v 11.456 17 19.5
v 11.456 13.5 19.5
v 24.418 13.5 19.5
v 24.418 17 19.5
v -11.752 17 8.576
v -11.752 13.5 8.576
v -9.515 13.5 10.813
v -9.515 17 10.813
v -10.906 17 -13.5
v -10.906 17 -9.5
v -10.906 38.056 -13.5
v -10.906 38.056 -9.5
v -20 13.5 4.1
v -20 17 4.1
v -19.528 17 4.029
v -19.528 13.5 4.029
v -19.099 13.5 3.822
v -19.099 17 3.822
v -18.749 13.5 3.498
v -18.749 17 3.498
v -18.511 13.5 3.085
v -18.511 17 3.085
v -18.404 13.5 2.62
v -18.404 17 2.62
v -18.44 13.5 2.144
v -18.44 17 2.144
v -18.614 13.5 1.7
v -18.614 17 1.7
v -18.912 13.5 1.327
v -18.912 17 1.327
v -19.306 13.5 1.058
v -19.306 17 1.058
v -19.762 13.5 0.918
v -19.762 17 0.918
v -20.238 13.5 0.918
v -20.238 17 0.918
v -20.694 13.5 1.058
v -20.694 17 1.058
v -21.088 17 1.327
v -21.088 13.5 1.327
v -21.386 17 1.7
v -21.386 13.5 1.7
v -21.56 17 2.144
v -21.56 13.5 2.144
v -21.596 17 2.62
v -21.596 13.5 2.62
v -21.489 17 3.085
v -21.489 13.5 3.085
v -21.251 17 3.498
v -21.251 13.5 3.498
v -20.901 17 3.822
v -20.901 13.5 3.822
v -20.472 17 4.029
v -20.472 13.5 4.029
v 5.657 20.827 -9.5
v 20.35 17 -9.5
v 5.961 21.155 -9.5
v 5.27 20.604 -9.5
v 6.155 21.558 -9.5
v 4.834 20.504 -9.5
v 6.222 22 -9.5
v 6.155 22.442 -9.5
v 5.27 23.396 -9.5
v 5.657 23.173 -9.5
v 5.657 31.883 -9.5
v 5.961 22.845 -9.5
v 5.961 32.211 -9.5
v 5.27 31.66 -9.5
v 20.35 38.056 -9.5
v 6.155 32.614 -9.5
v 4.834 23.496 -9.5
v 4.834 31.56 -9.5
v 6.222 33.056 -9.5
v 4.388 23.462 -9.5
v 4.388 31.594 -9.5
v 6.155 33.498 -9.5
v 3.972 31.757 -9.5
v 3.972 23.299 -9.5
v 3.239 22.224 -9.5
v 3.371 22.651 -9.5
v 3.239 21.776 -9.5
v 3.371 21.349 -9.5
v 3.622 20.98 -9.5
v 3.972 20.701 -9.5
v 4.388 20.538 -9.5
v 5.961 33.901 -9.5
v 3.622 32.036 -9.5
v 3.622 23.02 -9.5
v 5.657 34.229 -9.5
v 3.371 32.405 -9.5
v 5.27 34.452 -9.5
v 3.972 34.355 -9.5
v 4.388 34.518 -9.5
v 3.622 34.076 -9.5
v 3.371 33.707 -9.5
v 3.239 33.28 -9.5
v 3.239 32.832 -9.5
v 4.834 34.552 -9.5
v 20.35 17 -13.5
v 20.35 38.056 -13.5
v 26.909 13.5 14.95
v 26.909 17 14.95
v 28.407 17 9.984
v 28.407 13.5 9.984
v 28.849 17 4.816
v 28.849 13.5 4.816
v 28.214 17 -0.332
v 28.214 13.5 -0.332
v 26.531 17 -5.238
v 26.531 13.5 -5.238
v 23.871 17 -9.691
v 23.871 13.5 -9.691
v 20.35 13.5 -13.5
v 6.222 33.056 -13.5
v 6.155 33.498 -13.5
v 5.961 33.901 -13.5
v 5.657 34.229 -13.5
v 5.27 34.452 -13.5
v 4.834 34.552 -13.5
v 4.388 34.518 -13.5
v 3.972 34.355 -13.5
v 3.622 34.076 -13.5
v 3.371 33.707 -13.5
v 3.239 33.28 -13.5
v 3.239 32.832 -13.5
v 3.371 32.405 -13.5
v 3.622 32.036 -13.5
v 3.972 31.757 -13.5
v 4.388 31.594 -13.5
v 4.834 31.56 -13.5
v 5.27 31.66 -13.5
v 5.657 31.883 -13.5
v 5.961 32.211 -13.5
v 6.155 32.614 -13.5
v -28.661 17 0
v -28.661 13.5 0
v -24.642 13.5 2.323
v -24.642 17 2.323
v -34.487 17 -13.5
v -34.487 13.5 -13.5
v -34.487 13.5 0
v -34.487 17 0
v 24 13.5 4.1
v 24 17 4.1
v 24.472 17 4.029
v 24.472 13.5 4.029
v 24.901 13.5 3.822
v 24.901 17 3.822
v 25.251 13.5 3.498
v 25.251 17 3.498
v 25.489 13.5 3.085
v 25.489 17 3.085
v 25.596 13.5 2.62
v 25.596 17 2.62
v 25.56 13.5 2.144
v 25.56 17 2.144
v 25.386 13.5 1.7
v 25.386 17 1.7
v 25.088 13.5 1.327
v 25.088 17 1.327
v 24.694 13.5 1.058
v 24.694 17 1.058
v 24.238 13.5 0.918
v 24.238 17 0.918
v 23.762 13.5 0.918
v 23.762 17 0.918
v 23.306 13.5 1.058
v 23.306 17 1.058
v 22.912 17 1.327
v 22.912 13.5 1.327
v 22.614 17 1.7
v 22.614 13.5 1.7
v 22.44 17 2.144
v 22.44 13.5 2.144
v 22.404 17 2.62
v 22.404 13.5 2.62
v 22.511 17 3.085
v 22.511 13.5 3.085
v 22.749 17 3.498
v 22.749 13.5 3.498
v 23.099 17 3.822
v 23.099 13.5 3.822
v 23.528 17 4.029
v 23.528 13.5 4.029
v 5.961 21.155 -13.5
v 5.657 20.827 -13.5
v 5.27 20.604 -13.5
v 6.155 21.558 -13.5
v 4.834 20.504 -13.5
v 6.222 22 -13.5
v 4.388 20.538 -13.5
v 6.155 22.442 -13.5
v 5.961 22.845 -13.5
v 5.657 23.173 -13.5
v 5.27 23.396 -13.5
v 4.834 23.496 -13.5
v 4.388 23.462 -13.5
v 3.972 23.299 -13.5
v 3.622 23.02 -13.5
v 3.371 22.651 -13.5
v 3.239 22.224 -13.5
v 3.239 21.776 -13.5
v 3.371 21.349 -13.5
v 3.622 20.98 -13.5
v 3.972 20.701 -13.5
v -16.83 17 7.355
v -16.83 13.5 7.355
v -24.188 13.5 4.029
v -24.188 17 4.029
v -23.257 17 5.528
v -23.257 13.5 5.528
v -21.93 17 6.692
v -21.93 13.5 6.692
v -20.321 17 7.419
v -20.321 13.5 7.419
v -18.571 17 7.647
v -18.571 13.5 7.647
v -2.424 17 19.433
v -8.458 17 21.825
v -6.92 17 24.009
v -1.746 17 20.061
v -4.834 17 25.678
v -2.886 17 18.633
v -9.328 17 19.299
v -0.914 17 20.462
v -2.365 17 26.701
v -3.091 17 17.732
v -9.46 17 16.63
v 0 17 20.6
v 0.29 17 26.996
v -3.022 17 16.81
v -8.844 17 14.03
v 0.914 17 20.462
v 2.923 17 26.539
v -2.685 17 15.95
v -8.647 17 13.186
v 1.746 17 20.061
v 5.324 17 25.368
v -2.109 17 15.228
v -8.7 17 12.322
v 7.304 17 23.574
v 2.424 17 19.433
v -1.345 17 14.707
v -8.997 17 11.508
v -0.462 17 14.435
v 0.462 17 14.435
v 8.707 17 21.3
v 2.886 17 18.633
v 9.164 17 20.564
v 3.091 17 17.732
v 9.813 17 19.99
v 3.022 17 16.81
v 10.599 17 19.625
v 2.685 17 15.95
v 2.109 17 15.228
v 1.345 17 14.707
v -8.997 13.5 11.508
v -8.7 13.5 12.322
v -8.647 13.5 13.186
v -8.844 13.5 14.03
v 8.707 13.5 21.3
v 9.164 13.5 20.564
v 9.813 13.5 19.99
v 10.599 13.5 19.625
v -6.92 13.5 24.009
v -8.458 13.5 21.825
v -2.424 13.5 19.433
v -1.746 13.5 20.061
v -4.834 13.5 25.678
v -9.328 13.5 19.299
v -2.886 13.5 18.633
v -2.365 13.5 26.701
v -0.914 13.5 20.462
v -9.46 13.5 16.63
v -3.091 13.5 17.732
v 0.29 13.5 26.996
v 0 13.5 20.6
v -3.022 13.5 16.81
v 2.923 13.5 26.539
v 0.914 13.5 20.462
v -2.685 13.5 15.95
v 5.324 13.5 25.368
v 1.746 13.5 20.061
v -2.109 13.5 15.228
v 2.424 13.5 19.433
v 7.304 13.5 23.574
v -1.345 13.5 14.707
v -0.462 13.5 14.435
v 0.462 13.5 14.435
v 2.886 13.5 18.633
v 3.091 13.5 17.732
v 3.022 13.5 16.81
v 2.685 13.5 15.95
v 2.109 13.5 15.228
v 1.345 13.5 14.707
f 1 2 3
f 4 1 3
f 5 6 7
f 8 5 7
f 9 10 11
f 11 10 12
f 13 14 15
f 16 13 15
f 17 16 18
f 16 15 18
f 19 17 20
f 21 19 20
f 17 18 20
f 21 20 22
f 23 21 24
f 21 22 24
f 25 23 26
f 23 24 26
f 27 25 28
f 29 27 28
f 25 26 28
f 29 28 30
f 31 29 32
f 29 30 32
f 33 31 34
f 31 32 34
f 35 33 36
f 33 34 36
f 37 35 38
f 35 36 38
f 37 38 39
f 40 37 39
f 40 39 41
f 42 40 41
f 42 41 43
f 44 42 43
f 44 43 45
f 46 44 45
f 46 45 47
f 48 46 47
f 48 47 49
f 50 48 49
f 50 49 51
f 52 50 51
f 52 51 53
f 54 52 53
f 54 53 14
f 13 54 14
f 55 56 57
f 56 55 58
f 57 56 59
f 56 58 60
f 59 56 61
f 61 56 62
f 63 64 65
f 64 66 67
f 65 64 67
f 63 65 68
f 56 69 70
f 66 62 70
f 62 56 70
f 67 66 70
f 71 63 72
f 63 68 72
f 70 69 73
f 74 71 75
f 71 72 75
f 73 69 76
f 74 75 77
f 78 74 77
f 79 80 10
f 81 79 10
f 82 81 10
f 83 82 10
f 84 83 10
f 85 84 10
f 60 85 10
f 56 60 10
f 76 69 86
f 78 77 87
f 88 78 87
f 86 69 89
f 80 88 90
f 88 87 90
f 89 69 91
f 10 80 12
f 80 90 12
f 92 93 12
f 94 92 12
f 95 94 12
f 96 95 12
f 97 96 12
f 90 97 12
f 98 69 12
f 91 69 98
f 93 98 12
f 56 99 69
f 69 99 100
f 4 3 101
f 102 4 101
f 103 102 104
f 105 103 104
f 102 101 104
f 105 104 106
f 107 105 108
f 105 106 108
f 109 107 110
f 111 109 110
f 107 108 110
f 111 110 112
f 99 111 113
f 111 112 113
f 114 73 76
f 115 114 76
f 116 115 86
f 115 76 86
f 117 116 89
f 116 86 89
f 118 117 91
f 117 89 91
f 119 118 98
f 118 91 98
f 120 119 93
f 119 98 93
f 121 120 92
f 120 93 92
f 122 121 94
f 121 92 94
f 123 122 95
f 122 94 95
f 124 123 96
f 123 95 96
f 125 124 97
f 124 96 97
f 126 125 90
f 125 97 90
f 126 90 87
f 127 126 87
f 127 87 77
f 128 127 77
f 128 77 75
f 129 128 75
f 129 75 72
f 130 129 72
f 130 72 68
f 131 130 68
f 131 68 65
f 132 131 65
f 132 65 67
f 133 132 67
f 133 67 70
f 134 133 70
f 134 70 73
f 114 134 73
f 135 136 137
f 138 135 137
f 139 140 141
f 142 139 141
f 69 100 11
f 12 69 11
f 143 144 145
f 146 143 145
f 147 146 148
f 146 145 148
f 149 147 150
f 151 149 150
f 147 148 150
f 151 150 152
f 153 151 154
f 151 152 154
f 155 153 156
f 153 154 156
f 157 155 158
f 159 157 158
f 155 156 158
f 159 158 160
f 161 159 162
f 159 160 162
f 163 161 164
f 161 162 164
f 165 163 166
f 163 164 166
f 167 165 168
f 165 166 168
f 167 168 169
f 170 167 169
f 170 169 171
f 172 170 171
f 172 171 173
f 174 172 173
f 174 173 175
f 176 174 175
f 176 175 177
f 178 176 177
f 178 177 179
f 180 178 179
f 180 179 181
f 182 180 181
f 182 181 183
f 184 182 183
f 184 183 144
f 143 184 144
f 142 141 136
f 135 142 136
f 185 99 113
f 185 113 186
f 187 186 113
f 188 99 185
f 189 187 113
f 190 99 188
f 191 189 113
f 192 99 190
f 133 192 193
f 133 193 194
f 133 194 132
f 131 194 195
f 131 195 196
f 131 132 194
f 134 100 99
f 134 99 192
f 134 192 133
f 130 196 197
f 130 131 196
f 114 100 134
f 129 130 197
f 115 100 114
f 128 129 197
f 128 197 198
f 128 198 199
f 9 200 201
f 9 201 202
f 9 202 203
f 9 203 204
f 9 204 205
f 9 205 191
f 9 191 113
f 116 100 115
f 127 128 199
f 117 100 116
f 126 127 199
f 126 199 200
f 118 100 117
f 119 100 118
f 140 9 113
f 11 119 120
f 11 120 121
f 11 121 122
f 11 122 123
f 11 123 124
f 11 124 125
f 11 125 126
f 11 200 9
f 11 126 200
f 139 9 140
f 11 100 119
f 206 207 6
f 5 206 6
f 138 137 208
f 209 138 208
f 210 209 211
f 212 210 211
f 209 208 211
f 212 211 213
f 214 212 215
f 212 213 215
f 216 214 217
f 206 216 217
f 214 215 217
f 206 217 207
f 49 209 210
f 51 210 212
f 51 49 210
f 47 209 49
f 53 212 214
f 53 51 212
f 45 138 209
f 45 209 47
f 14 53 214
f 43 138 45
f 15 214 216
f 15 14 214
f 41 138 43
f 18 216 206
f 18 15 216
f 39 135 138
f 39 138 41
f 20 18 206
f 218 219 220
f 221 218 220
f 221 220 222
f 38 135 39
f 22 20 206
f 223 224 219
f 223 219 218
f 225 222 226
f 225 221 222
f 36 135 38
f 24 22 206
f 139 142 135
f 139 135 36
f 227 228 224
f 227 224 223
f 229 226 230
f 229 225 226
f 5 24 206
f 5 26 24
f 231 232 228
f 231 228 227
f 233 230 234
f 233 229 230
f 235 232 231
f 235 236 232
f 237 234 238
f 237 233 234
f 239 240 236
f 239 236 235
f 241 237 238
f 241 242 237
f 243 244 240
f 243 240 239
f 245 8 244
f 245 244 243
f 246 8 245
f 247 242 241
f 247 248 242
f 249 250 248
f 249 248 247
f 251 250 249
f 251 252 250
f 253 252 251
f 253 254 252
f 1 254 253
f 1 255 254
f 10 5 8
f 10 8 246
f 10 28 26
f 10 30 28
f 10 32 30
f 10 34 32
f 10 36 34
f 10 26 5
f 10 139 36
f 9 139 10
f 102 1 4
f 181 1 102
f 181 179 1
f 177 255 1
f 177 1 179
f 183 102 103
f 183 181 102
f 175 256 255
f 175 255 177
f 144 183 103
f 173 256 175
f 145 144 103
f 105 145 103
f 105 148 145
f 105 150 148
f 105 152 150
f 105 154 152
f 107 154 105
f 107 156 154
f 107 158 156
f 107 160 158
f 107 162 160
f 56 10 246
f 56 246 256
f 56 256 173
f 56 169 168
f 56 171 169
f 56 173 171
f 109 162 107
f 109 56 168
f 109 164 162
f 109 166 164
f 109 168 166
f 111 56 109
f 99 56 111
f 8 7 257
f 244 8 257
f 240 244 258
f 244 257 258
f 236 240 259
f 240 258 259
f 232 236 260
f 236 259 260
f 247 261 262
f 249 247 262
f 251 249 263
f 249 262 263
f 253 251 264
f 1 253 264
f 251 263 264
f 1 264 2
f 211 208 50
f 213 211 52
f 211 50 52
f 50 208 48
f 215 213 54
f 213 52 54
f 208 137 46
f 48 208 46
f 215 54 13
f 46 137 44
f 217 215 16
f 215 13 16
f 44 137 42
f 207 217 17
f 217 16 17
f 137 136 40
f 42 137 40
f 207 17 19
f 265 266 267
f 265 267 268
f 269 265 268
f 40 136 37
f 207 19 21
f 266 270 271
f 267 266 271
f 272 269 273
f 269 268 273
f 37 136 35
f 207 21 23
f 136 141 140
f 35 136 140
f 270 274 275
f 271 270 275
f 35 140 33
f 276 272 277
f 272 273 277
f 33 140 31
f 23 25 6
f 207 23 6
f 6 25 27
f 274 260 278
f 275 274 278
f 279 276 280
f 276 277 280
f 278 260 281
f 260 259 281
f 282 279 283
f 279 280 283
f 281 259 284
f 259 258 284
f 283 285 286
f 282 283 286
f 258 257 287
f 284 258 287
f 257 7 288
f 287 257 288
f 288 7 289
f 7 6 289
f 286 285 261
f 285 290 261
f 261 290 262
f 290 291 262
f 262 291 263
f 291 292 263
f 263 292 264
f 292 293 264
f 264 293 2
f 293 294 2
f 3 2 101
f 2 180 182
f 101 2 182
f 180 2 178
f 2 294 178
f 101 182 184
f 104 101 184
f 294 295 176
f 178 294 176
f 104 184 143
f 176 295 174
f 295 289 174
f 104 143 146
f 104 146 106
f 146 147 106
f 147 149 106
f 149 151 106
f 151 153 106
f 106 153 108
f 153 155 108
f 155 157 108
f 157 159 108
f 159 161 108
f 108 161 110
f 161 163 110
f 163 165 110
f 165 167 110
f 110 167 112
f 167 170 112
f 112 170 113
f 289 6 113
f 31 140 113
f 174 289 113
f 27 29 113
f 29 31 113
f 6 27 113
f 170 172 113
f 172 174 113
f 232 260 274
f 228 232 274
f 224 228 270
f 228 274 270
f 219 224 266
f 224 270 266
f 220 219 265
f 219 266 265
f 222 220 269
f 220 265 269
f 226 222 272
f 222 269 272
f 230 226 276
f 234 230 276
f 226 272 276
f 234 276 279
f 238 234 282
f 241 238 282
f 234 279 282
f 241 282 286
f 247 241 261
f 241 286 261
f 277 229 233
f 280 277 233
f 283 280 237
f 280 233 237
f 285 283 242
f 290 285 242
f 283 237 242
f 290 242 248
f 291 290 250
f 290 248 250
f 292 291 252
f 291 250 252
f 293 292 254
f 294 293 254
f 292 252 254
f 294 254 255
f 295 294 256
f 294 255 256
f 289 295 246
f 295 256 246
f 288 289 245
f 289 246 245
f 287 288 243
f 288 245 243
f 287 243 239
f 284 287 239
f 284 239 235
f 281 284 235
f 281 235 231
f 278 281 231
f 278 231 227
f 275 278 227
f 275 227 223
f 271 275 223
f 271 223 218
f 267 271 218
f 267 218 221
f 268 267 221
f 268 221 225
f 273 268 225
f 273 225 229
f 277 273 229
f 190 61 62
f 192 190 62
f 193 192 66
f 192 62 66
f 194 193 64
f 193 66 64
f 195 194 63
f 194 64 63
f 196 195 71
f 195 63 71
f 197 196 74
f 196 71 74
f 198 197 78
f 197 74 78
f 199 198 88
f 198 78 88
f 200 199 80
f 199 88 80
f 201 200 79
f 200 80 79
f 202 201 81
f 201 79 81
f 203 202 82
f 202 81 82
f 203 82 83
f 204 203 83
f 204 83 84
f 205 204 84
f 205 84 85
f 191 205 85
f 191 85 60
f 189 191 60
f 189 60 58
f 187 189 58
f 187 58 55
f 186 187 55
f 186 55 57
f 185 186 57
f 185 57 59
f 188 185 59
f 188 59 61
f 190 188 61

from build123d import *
from build123d.topology import SkipClean

# Parameters (mm, degrees)
CROQUIS1_W              = 70
CROQUIS1_H              = 65
EXTRUIR1_DEPTH          = 3.5
CROQUIS2_R              = 3.1
EXTRUIR2_DEPTH          = 5
EXTRUIR3_DEPTH          = 10
CROQUIS4_OUTSIDE_W      = 91.294
CROQUIS4_OUTSIDE_H      = 86.294
EXTRUIR4_DEPTH          = 10
REDONDEO1_R             = 3
EXTRUIR5_DEPTH          = 13.5
EXTRUIR6_DEPTH          = 3.5
CROQUIS7_R              = 1.6
EXTRUIR7_DEPTH          = 47.982330447
CROQUIS8_R              = 3.1
EXTRUIR8_DEPTH          = 5
CROQUIS9_W              = 0.7
CROQUIS9_H              = 10.5
EXTRUIR9_DEPTH          = 10
EXTRUIR10_DEPTH         = 63.752948337
EXTRUIR10_DEPTH_BACK    = 10
CROQUIS10_W             = 3.0625
CROQUIS10_H             = 5
CROQUIS11_W             = 54.8364
CROQUIS11_H             = 21.05596306
SALIENTE_EXTRUIR1_DEPTH = 4
CROQUIS15_W             = 23.581168674
CROQUIS15_H             = 21.05596306
CORTAR_EXTRUIR3_DEPTH   = 10
CROQUIS16_R             = 1.5
CORTAR_EXTRUIR4_DEPTH   = 10


with BuildPart() as part:
    # Croquis1 → Extruir1 (new body)
    with BuildSketch(Plane(origin=(0, 0, 0), x_dir=(1, 0, 0), z_dir=(0, 1, 0))):
        Rectangle(CROQUIS1_W, CROQUIS1_H)
    extrude(amount=EXTRUIR1_DEPTH)

    # Croquis2 → Extruir2 (cut)
    with BuildSketch(Plane(origin=(0, 3.5, 0), x_dir=(1, 0, 0), z_dir=(0, 1, 0))):
        with Locations(Location((0, -17.5, 0), (0, 0, 270))):
            Circle(CROQUIS2_R)
    extrude(amount=-EXTRUIR2_DEPTH, mode=Mode.SUBTRACT)

    # Croquis3 → Extruir3 (add)
    with BuildSketch(Plane(origin=(0, 3.5, 0), x_dir=(1, 0, 0), z_dir=(0, 1, 0))):
        with BuildLine():
            Line((-34.4868, 13.5), (20.3496, 13.5))
            Line((20.3496, 13.5), (20.3496, 0))
            Line((20.3496, 0), (17.146428199, 0))
            ThreePointArc((17.146428199, 0), (22.955777517, -8.939493087), (24.418230894, -19.5))
            Line((24.418230894, -19.5), (9.287087811, -19.5))
            ThreePointArc((9.287087811, -19.5), (-3.635492607, -26.276855559), (-7.981176331, -12.347250794))
            Line((-7.981176331, -12.347250794), (-18.680510212, -1.647916913))
            ThreePointArc((-18.680510212, -1.647916913), (-17.932408832, -0.806327142), (-17.146428199, 0))
            Line((-17.146428199, 0), (-34.4868, 0))
            Line((-34.4868, 0), (-34.4868, 13.5))
        make_face()
        with BuildLine():
            Line((-32.9868, 1.5), (-12.961481397, 1.5))
            ThreePointArc((-12.961481397, 1.5), (-14.868021343, 0.048274597), (-16.613165932, -1.593940849))
            Line((-16.613165932, -1.593940849), (-5.999348286, -12.207758495))
            ThreePointArc((-5.999348286, -12.207758495), (-3.061467459, -24.89103626), (7.984359711, -18))
            Line((7.984359711, -18), (22.994564575, -18))
            ThreePointArc((22.994564575, -18), (20.451694563, -6.977253708), (12.961481397, 1.5))
            Line((12.961481397, 1.5), (18.8496, 1.5))
            Line((18.8496, 1.5), (18.8496, 12))
            Line((18.8496, 12), (-32.9868, 12))
            Line((-32.9868, 12), (-32.9868, 1.5))
        make_face(mode=Mode.SUBTRACT)
    extrude(amount=EXTRUIR3_DEPTH)

    # Croquis4 outside → Extruir4 (cut)
    with SkipClean():  # the faces are left unmerged after this step: merging them gives an invalid solid
        with BuildSketch(Plane(origin=(0, 3.5, 0), x_dir=(1, 0, 0), z_dir=(0, 1, 0))):
            Rectangle(CROQUIS4_OUTSIDE_W, CROQUIS4_OUTSIDE_H)
            with BuildLine():
                Line((-34.4868, 0), (-17.146428199, 0))
                ThreePointArc((-17.146428199, 0), (-17.932408832, -0.806327142), (-18.680510212, -1.647916913))
                Line((-18.680510212, -1.647916913), (-7.981176331, -12.347250794))
                ThreePointArc((-7.981176331, -12.347250794), (-3.635492607, -26.276855559), (9.287087811, -19.5))
                Line((9.287087811, -19.5), (24.418230894, -19.5))
                ThreePointArc((24.418230894, -19.5), (22.955777517, -8.939493087), (17.146428199, 0))
                Line((17.146428199, 0), (20.3496, 0))
                Line((20.3496, 0), (20.3496, 13.5))
                Line((20.3496, 13.5), (-34.4868, 13.5))
                Line((-34.4868, 13.5), (-34.4868, 0))
            make_face(mode=Mode.SUBTRACT)
        extrude(amount=-EXTRUIR4_DEPTH, mode=Mode.SUBTRACT)

    # Redondeo1
    redondeo1_edges = [part.edges().sort_by_distance(p)[0] for p in [
        (-7.981176331, 8.5, 12.347250794),
        (9.287087811, 8.5, 19.5),
        (-5.999348286, 8.5, 12.207758495),
        (7.984359711, 8.5, 18),
    ]]
    fillet(redondeo1_edges, radius=REDONDEO1_R)

    # Croquis5 → Extruir5 (add)
    with SkipClean():  # the faces are left unmerged after this step: merging them gives an invalid solid
        with BuildSketch(Plane.XZ):
            with BuildLine():
                Line((-18.680510212, 1.647916913), (-14.437869525, 5.8905576))
                ThreePointArc((-14.437869525, 5.8905576), (-21.723092903, 6.819250451), (-24.449770984, 0))
                Line((-24.449770984, 0), (-17.146428199, 0))
                ThreePointArc((-17.146428199, 0), (-17.932408832, 0.806327142), (-18.680510212, 1.647916913))
            make_face()
            with BuildLine():
                Line((20.3496, 0), (20.3496, -13.5))
                ThreePointArc((20.3496, -13.5), (28.665212431, 2.225567304), (24.418230894, 19.5))
                ThreePointArc((24.418230894, 19.5), (22.955777517, 8.939493087), (17.146428199, 0))
                Line((17.146428199, 0), (20.3496, 0))
            make_face()
        extrude(amount=-EXTRUIR5_DEPTH)

    # Chaflán1
    # the kernel refuses this chamfer: 5, 4.044665138 mm, written as the material it adds along each edge
    with BuildSketch(Plane(origin=(-14.437869525, 3.5, 5.8905576), x_dir=(-0.8768595348589333, 0, 0.4807466652270976), z_dir=(0, 1, 0))) as chafl_n1_piece_1:
        with BuildLine():
            Line((2.949791971, 0), (-1.211824758, 3.780414953))
            Line((-1.211824758, 3.780414953), (-1.307822013, 3.752405544))
            ThreePointArc((-1.307822013, 3.752405544), (-0.651776703, 1.876825504), (-0.095997255, -0.02800941))
            Line((-0.095997255, -0.02800941), (0.02800941, -0.095997255))
            ThreePointArc((0.02800941, -0.095997255), (1.47002525, 0.136406993), (2.931105495, -0.098238565))
            Line((2.931105495, -0.098238565), (2.949791971, 0))
        make_face()
    extrude(amount=10)
    with BuildSketch(Plane(origin=(-24.449770984, 3.5, 0), x_dir=(-0.008036803743584595, 0, 0.9999677043712897), z_dir=(0, 1, 0))) as chafl_n1_piece_2:
        with BuildLine():
            Line((2.423263449, 0), (-0.064845869, -4.38542071))
            Line((-0.064845869, -4.38542071), (-0.164842639, -4.386224391))
            ThreePointArc((-0.164842639, -4.386224391), (-0.082377051, -2.193111839), (-0.09999677, -0.00080368))
            Line((-0.09999677, -0.00080368), (0.026691621, 0.096371974))
            ThreePointArc((0.026691621, 0.096371974), (1.204598314, -0.104316531), (2.411212242, 0.099271186))
            Line((2.411212242, 0.099271186), (2.423263449, 0))
        make_face()
    extrude(amount=10)
    with BuildSketch(Plane(origin=(-24.449770984, 0, 0), x_dir=(-0.9997395779240649, 0, -0.022820524363231526), z_dir=(0, 1, 0))) as chafl_n1_piece_3:
        with BuildLine():
            Line((4.385900112, 0), (-0.035828136, 2.422998574))
            Line((-0.035828136, 2.422998574), (-0.134910293, 2.409480951))
            ThreePointArc((-0.134910293, 2.409480951), (0.08649505, 1.206008973), (-0.096756078, 0.025263837))
            Line((-0.096756078, 0.025263837), (0.002282052, -0.099973958))
            ThreePointArc((0.002282052, -0.099973958), (2.194090072, -0.04994272), (4.388182164, -0.099973958))
            Line((4.388182164, -0.099973958), (4.385900112, 0))
        make_face()
    extrude(amount=3.5)
    with BuildSketch(Plane(origin=(-14.437869525, 0, 5.8905576), x_dir=(0.7254657554746632, 0, 0.6882582637597433), z_dir=(0, 1, 0))) as chafl_n1_piece_4:
        with BuildLine():
            Line((3.96989376, 0), (-0.900434913, -2.809001538))
            Line((-0.900434913, -2.809001538), (-0.98828054, -2.761219262))
            ThreePointArc((-0.98828054, -2.761219262), (-0.318834214, -1.441501248), (-0.099965384, 0.002630967))
            Line((-0.099965384, 0.002630967), (0.002630967, 0.099965384))
            ThreePointArc((0.002630967, 0.099965384), (1.986203869, 0.047760165), (3.972524727, 0.099965384))
            Line((3.972524727, 0.099965384), (3.96989376, 0))
        make_face()
    extrude(amount=3.5)


with BuildPart() as body_2:
    # Croquis6 → Extruir6 (new body)
    with BuildSketch(Plane(origin=(0, 13.5, 0), x_dir=(1, 0, 0), z_dir=(0, 1, 0))):
        with BuildLine():
            Line((-34.4868, 13.5), (-34.4868, 0))
            Line((-34.4868, 0), (-28.661374979, 0))
            Line((-28.661374979, 0), (-24.642400208, -2.323096648))
            ThreePointArc((-24.642400208, -2.323096648), (-21.929637735, -6.692039268), (-16.829963308, -7.355409896))
            Line((-16.829963308, -7.355409896), (-11.752306982, -8.576120143))
            Line((-11.752306982, -8.576120143), (-9.515139435, -10.813287689))
            ThreePointArc((-9.515139435, -10.813287689), (-8.69974084, -12.321679102), (-8.843709432, -14.030302105))
            ThreePointArc((-8.843709432, -14.030302105), (-3.635492607, -26.276855559), (8.70689382, -21.3))
            ThreePointArc((8.70689382, -21.3), (9.813271565, -19.99001992), (11.456439237, -19.5))
            Line((11.456439237, -19.5), (24.418230894, -19.5))
            ThreePointArc((24.418230894, -19.5), (28.665212431, -2.225567304), (20.3496, 13.5))
            Line((20.3496, 13.5), (-34.4868, 13.5))
        make_face()
    extrude(amount=EXTRUIR6_DEPTH)


with BuildPart() as extruir7_tool:
    # Croquis7 → Extruir7 (new, through all)
    with BuildSketch(Plane(origin=(0, 17, 0), x_dir=(1, 0, 0), z_dir=(0, 1, 0))):
        with Locations(Location((-20, -2.5, 0), (0, 0, 270))):
            Circle(CROQUIS7_R)
        with Locations(Location((24, -2.5, 0), (0, 0, 270))):
            Circle(CROQUIS7_R)
    extrude(amount=-EXTRUIR7_DEPTH)


with BuildPart() as part_1:
    add(part.part)

    # Extruir7: cut by extruir7_tool
    add(extruir7_tool.part, mode=Mode.SUBTRACT)

    # Croquis9 → Extruir9 (cut)
    with BuildSketch(Plane(origin=(0, 13.5, 0), x_dir=(1, 0, 0), z_dir=(0, 1, 0))):
        with Locations((19.1996, 6.75)):
            Rectangle(CROQUIS9_W, CROQUIS9_H)
    extrude(amount=-EXTRUIR9_DEPTH, mode=Mode.SUBTRACT)

    # Croquis10 → Extruir10 (cut, two sides: drawn at the far end of the back side and taken through both)
    with BuildSketch(Plane.ZY.offset(-19.5496).offset(-EXTRUIR10_DEPTH_BACK)):
        with Locations((-8.9375, 8.5)):
            Rectangle(CROQUIS10_W, CROQUIS10_H)
    extrude(amount=EXTRUIR10_DEPTH + EXTRUIR10_DEPTH_BACK, mode=Mode.SUBTRACT)


with BuildPart() as body_2_1:
    add(body_2.part)

    # Extruir7: cut by extruir7_tool
    add(extruir7_tool.part, mode=Mode.SUBTRACT)

    # Croquis8 → Extruir8 (cut)
    with BuildSketch(Plane(origin=(0, 17, 0), x_dir=(1, 0, 0), z_dir=(0, 1, 0))):
        with Locations(Location((0, -17.5, 0), (0, 0, 270))):
            Circle(CROQUIS8_R)
    extrude(amount=-EXTRUIR8_DEPTH, mode=Mode.SUBTRACT)

    # Croquis11 → Saliente-Extruir1 (add)
    with BuildSketch(Plane(origin=(0, 0, -13.5), x_dir=(-1, 0, 0), z_dir=(0, 0, -1))):
        with Locations((7.0686, 27.52798153)):
            Rectangle(CROQUIS11_W, CROQUIS11_H)
    extrude(amount=-SALIENTE_EXTRUIR1_DEPTH)

    # Croquis15 → Cortar-Extruir3 (cut)
    with BuildSketch(Plane.XY.offset(-9.5)):
        with Locations((-22.696215663, 27.52798153)):
            Rectangle(CROQUIS15_W, CROQUIS15_H)
    extrude(amount=-CORTAR_EXTRUIR3_DEPTH, mode=Mode.SUBTRACT)

    # Croquis16 → Cortar-Extruir4 (cut)
    with BuildSketch(Plane.XY.offset(-9.5)):
        with Locations((4.721984337, 33.05596306)):
            Circle(CROQUIS16_R)
        with Locations((4.721984337, 22)):
            Circle(CROQUIS16_R)
    extrude(amount=-CORTAR_EXTRUIR4_DEPTH, mode=Mode.SUBTRACT)


solid = body_2_1.part
